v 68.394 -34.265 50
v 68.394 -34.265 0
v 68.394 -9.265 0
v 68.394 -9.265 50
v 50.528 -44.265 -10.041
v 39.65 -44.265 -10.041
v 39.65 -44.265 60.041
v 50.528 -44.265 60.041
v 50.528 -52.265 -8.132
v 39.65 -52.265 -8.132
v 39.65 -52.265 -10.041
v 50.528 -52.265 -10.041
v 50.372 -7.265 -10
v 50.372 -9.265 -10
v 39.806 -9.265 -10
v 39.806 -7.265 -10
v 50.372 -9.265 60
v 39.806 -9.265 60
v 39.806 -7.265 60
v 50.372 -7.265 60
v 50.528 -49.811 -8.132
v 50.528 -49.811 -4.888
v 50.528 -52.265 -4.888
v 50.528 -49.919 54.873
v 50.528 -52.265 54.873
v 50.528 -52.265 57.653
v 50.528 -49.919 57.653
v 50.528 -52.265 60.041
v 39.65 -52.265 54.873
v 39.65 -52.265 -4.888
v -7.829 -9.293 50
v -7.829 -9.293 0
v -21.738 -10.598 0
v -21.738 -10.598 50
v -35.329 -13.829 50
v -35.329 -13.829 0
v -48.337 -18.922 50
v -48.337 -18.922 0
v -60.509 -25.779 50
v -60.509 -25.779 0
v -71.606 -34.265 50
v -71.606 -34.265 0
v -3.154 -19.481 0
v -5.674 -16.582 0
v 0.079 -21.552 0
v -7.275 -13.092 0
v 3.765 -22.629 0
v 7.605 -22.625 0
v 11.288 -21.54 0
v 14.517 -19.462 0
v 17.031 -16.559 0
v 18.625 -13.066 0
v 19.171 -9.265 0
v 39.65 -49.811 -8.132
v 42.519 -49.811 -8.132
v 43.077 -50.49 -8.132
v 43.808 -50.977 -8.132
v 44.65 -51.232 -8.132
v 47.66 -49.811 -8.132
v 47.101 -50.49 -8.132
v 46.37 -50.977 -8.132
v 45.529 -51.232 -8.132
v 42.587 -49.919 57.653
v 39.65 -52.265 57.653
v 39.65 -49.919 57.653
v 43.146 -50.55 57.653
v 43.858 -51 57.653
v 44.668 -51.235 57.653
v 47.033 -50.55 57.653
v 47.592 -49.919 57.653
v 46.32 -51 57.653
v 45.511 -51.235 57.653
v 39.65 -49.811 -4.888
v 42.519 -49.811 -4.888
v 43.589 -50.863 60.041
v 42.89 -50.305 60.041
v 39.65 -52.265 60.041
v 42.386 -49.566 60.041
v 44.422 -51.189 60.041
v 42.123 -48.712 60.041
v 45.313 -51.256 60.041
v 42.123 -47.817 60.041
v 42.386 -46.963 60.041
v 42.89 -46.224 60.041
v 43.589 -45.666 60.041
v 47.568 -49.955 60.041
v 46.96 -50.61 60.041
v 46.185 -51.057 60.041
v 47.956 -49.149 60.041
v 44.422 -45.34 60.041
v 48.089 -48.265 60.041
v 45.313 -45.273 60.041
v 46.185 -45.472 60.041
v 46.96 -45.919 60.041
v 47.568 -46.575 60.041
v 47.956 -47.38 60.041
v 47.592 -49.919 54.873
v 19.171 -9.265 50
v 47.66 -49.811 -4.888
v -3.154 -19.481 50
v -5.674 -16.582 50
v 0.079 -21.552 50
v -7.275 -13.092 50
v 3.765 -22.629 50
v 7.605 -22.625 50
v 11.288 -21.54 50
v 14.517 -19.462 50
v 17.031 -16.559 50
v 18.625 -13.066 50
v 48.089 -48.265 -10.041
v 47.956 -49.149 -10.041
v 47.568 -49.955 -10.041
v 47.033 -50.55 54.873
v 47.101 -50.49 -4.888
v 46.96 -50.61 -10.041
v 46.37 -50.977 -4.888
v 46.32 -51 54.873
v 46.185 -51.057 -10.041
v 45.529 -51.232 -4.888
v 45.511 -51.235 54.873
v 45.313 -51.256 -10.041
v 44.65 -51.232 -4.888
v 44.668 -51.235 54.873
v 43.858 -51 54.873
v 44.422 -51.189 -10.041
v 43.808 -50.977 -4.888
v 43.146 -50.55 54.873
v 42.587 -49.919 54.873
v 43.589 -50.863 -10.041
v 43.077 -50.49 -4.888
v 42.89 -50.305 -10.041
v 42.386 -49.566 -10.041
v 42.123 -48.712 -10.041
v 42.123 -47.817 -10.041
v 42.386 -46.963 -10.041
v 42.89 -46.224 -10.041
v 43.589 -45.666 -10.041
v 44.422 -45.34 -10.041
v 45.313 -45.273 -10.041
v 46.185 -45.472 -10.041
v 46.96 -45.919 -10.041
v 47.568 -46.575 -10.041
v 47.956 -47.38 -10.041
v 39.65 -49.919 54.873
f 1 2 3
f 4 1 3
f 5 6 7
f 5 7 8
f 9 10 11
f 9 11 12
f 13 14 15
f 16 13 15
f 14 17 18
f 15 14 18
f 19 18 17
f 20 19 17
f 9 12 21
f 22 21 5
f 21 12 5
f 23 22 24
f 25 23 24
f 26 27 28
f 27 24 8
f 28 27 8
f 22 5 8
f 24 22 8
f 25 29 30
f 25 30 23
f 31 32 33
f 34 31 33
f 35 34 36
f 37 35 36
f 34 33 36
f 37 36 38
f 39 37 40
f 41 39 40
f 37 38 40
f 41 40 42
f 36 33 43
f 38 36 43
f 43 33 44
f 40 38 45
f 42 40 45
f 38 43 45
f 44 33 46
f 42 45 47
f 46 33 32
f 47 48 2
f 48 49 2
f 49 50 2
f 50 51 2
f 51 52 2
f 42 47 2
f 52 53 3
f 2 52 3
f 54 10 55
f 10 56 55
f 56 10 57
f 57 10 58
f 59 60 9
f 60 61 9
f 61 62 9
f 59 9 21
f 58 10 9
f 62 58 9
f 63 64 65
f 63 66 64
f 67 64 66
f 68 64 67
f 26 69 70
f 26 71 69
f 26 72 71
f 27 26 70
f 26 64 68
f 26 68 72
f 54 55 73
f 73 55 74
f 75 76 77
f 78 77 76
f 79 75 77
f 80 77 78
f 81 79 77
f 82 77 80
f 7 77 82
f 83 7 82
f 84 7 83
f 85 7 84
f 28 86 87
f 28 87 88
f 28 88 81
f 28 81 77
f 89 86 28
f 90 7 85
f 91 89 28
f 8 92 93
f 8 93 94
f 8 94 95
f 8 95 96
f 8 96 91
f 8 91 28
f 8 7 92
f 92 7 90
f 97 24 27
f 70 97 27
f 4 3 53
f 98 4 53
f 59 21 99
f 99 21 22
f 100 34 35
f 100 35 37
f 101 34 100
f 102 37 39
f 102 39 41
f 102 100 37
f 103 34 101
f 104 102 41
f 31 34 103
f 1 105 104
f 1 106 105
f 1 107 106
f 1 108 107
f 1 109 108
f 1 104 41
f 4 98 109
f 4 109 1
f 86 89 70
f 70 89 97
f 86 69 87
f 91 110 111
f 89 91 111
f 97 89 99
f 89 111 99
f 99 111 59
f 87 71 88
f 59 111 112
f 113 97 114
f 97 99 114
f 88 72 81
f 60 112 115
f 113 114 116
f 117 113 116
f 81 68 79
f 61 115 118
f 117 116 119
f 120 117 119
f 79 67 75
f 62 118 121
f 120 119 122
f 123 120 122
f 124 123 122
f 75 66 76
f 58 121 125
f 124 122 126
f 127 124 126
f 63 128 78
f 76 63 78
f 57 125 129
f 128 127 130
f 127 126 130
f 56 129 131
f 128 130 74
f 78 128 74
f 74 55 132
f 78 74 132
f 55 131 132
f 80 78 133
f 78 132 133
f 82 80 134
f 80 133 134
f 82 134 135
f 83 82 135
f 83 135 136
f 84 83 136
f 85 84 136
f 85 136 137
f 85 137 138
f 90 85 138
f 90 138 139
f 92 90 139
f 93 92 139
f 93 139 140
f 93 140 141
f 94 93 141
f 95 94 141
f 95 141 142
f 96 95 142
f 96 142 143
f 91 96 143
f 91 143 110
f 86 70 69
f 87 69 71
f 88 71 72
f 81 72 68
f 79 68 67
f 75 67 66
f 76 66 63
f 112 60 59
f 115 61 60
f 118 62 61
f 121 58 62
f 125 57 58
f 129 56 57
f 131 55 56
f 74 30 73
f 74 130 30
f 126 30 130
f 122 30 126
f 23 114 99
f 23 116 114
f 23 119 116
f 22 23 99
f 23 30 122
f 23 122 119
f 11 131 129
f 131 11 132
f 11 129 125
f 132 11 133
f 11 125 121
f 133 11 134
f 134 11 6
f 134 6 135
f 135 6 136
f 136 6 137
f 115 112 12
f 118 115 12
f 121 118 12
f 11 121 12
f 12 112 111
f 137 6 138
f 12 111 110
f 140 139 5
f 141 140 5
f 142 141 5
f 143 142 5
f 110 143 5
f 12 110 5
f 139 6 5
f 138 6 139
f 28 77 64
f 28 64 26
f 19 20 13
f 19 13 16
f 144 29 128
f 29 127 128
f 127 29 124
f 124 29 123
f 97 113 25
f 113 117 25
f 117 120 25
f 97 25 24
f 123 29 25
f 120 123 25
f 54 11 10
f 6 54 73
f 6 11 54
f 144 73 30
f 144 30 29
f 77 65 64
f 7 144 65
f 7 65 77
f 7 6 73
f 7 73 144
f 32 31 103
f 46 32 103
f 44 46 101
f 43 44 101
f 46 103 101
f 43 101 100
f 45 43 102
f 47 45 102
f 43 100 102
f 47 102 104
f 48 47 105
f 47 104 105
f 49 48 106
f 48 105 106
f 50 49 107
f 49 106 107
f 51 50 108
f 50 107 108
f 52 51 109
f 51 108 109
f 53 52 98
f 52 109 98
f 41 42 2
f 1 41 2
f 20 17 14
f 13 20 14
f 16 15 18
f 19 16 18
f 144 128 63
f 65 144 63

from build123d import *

# Parameters (mm, degrees)
F1_DEPTH  = 50
F3_DEPTH  = 50
F5_DEPTH  = 2
F6_W      = 2
F6_H      = 2.1376970706
F7_DEPTH  = 35
F8_W      = 10.8773745596
F8_H      = 70.0813960284
F9_DEPTH  = 8
F10_R     = 3
F11_DEPTH = 70.0823960284
F13_W     = 2.3453889781
F13_H     = 2.7803070843
F14_DEPTH = 25
F15_W     = 2.4533367151
F15_H     = 3.2436903566
F16_DEPTH = 25


with BuildPart() as f1:
    # F0 (on Top) → F1 (new body)
    with BuildSketch(Plane.XY):
        with BuildLine():
            ThreePointArc((-5.4621001933, -9.2645695501), (-40.8174392526, -15.7231348808), (-71.6058829699, -34.2645695501))
            Line((-71.6058829699, -34.2645695501), (68.3941170301, -34.2645695501))
            Line((68.3941170301, -34.2645695501), (68.3941170301, -9.2645695501))
            Line((68.3941170301, -9.2645695501), (-5.4621001933, -9.2645695501))
        make_face()
    extrude(amount=F1_DEPTH)

    # F2 (on face) → F3 (cut)
    with BuildSketch(Plane.XY.offset(50)):
        with BuildLine():
            ThreePointArc((-7.829049518, -9.2925857202), (5.6849295039, -22.7645622825), (19.1709214114, -9.2645695501))
            Line((19.1709214114, -9.2645695501), (-5.4621001933, -9.2645695501))
            ThreePointArc((-5.4621001933, -9.2645695501), (-6.6456577554, -9.2715738379), (-7.829049518, -9.2925857202))
        make_face()
    extrude(amount=-F3_DEPTH, mode=Mode.SUBTRACT)


with BuildPart() as f5:
    # F4 (on face) → F5 (new body)
    with BuildSketch(Plane(origin=(0, -9.2645695501, 0), x_dir=(-1, 0, 0), z_dir=(0, 1, 0))):
        Polygon((-50.3724478185, 60), (-50.3724478185, 50), (-50.3724478185, 0), (-50.3724478185, -10), (-39.8058518767, -10), (-39.8058518767, 0), (-39.8058518767, 50), (-39.8058518767, 60), align=None)
    extrude(amount=F5_DEPTH)


with BuildPart() as f7:
    # F6 (on face) → F7 (new body)
    with BuildSketch(Plane.XZ.offset(9.2645695501)):
        with Locations((44.7074491531, 54.6884573996)):
            Rectangle(F6_W, F6_H)
    extrude(amount=F7_DEPTH)


with BuildPart() as f9:
    # F8 (on face) → F9 (new body)
    with BuildSketch(Plane.XZ.offset(44.2645695501)):
        with Locations((45.0891498476, 24.9999994412)):
            Rectangle(F8_W, F8_H)
    extrude(amount=F9_DEPTH)

    # F10 (on face) → F11 (cut, through all)
    with BuildSketch(Plane(origin=(0, 0, -10.040698573), x_dir=(1, 0, 0), z_dir=(0, 0, -1))):
        with Locations((45.0891498476, 48.2645695501)):
            Circle(F10_R)
    extrude(amount=-F11_DEPTH, mode=Mode.SUBTRACT)

    # F13 (on face) → F14 (cut)
    with BuildSketch(Plane.YZ.offset(50.5278371274)):
        with Locations((-51.0918750611, 56.2631879002)):
            Rectangle(F13_W, F13_H)
    extrude(amount=-F14_DEPTH, mode=Mode.SUBTRACT)

    # F15 (on face) → F16 (cut)
    with BuildSketch(Plane.YZ.offset(50.5278371274)):
        with Locations((-51.0379011926, -6.5101496875)):
            Rectangle(F15_W, F15_H)
    extrude(amount=-F16_DEPTH, mode=Mode.SUBTRACT)


solid = Compound([f1.part, f5.part, f9.part])
